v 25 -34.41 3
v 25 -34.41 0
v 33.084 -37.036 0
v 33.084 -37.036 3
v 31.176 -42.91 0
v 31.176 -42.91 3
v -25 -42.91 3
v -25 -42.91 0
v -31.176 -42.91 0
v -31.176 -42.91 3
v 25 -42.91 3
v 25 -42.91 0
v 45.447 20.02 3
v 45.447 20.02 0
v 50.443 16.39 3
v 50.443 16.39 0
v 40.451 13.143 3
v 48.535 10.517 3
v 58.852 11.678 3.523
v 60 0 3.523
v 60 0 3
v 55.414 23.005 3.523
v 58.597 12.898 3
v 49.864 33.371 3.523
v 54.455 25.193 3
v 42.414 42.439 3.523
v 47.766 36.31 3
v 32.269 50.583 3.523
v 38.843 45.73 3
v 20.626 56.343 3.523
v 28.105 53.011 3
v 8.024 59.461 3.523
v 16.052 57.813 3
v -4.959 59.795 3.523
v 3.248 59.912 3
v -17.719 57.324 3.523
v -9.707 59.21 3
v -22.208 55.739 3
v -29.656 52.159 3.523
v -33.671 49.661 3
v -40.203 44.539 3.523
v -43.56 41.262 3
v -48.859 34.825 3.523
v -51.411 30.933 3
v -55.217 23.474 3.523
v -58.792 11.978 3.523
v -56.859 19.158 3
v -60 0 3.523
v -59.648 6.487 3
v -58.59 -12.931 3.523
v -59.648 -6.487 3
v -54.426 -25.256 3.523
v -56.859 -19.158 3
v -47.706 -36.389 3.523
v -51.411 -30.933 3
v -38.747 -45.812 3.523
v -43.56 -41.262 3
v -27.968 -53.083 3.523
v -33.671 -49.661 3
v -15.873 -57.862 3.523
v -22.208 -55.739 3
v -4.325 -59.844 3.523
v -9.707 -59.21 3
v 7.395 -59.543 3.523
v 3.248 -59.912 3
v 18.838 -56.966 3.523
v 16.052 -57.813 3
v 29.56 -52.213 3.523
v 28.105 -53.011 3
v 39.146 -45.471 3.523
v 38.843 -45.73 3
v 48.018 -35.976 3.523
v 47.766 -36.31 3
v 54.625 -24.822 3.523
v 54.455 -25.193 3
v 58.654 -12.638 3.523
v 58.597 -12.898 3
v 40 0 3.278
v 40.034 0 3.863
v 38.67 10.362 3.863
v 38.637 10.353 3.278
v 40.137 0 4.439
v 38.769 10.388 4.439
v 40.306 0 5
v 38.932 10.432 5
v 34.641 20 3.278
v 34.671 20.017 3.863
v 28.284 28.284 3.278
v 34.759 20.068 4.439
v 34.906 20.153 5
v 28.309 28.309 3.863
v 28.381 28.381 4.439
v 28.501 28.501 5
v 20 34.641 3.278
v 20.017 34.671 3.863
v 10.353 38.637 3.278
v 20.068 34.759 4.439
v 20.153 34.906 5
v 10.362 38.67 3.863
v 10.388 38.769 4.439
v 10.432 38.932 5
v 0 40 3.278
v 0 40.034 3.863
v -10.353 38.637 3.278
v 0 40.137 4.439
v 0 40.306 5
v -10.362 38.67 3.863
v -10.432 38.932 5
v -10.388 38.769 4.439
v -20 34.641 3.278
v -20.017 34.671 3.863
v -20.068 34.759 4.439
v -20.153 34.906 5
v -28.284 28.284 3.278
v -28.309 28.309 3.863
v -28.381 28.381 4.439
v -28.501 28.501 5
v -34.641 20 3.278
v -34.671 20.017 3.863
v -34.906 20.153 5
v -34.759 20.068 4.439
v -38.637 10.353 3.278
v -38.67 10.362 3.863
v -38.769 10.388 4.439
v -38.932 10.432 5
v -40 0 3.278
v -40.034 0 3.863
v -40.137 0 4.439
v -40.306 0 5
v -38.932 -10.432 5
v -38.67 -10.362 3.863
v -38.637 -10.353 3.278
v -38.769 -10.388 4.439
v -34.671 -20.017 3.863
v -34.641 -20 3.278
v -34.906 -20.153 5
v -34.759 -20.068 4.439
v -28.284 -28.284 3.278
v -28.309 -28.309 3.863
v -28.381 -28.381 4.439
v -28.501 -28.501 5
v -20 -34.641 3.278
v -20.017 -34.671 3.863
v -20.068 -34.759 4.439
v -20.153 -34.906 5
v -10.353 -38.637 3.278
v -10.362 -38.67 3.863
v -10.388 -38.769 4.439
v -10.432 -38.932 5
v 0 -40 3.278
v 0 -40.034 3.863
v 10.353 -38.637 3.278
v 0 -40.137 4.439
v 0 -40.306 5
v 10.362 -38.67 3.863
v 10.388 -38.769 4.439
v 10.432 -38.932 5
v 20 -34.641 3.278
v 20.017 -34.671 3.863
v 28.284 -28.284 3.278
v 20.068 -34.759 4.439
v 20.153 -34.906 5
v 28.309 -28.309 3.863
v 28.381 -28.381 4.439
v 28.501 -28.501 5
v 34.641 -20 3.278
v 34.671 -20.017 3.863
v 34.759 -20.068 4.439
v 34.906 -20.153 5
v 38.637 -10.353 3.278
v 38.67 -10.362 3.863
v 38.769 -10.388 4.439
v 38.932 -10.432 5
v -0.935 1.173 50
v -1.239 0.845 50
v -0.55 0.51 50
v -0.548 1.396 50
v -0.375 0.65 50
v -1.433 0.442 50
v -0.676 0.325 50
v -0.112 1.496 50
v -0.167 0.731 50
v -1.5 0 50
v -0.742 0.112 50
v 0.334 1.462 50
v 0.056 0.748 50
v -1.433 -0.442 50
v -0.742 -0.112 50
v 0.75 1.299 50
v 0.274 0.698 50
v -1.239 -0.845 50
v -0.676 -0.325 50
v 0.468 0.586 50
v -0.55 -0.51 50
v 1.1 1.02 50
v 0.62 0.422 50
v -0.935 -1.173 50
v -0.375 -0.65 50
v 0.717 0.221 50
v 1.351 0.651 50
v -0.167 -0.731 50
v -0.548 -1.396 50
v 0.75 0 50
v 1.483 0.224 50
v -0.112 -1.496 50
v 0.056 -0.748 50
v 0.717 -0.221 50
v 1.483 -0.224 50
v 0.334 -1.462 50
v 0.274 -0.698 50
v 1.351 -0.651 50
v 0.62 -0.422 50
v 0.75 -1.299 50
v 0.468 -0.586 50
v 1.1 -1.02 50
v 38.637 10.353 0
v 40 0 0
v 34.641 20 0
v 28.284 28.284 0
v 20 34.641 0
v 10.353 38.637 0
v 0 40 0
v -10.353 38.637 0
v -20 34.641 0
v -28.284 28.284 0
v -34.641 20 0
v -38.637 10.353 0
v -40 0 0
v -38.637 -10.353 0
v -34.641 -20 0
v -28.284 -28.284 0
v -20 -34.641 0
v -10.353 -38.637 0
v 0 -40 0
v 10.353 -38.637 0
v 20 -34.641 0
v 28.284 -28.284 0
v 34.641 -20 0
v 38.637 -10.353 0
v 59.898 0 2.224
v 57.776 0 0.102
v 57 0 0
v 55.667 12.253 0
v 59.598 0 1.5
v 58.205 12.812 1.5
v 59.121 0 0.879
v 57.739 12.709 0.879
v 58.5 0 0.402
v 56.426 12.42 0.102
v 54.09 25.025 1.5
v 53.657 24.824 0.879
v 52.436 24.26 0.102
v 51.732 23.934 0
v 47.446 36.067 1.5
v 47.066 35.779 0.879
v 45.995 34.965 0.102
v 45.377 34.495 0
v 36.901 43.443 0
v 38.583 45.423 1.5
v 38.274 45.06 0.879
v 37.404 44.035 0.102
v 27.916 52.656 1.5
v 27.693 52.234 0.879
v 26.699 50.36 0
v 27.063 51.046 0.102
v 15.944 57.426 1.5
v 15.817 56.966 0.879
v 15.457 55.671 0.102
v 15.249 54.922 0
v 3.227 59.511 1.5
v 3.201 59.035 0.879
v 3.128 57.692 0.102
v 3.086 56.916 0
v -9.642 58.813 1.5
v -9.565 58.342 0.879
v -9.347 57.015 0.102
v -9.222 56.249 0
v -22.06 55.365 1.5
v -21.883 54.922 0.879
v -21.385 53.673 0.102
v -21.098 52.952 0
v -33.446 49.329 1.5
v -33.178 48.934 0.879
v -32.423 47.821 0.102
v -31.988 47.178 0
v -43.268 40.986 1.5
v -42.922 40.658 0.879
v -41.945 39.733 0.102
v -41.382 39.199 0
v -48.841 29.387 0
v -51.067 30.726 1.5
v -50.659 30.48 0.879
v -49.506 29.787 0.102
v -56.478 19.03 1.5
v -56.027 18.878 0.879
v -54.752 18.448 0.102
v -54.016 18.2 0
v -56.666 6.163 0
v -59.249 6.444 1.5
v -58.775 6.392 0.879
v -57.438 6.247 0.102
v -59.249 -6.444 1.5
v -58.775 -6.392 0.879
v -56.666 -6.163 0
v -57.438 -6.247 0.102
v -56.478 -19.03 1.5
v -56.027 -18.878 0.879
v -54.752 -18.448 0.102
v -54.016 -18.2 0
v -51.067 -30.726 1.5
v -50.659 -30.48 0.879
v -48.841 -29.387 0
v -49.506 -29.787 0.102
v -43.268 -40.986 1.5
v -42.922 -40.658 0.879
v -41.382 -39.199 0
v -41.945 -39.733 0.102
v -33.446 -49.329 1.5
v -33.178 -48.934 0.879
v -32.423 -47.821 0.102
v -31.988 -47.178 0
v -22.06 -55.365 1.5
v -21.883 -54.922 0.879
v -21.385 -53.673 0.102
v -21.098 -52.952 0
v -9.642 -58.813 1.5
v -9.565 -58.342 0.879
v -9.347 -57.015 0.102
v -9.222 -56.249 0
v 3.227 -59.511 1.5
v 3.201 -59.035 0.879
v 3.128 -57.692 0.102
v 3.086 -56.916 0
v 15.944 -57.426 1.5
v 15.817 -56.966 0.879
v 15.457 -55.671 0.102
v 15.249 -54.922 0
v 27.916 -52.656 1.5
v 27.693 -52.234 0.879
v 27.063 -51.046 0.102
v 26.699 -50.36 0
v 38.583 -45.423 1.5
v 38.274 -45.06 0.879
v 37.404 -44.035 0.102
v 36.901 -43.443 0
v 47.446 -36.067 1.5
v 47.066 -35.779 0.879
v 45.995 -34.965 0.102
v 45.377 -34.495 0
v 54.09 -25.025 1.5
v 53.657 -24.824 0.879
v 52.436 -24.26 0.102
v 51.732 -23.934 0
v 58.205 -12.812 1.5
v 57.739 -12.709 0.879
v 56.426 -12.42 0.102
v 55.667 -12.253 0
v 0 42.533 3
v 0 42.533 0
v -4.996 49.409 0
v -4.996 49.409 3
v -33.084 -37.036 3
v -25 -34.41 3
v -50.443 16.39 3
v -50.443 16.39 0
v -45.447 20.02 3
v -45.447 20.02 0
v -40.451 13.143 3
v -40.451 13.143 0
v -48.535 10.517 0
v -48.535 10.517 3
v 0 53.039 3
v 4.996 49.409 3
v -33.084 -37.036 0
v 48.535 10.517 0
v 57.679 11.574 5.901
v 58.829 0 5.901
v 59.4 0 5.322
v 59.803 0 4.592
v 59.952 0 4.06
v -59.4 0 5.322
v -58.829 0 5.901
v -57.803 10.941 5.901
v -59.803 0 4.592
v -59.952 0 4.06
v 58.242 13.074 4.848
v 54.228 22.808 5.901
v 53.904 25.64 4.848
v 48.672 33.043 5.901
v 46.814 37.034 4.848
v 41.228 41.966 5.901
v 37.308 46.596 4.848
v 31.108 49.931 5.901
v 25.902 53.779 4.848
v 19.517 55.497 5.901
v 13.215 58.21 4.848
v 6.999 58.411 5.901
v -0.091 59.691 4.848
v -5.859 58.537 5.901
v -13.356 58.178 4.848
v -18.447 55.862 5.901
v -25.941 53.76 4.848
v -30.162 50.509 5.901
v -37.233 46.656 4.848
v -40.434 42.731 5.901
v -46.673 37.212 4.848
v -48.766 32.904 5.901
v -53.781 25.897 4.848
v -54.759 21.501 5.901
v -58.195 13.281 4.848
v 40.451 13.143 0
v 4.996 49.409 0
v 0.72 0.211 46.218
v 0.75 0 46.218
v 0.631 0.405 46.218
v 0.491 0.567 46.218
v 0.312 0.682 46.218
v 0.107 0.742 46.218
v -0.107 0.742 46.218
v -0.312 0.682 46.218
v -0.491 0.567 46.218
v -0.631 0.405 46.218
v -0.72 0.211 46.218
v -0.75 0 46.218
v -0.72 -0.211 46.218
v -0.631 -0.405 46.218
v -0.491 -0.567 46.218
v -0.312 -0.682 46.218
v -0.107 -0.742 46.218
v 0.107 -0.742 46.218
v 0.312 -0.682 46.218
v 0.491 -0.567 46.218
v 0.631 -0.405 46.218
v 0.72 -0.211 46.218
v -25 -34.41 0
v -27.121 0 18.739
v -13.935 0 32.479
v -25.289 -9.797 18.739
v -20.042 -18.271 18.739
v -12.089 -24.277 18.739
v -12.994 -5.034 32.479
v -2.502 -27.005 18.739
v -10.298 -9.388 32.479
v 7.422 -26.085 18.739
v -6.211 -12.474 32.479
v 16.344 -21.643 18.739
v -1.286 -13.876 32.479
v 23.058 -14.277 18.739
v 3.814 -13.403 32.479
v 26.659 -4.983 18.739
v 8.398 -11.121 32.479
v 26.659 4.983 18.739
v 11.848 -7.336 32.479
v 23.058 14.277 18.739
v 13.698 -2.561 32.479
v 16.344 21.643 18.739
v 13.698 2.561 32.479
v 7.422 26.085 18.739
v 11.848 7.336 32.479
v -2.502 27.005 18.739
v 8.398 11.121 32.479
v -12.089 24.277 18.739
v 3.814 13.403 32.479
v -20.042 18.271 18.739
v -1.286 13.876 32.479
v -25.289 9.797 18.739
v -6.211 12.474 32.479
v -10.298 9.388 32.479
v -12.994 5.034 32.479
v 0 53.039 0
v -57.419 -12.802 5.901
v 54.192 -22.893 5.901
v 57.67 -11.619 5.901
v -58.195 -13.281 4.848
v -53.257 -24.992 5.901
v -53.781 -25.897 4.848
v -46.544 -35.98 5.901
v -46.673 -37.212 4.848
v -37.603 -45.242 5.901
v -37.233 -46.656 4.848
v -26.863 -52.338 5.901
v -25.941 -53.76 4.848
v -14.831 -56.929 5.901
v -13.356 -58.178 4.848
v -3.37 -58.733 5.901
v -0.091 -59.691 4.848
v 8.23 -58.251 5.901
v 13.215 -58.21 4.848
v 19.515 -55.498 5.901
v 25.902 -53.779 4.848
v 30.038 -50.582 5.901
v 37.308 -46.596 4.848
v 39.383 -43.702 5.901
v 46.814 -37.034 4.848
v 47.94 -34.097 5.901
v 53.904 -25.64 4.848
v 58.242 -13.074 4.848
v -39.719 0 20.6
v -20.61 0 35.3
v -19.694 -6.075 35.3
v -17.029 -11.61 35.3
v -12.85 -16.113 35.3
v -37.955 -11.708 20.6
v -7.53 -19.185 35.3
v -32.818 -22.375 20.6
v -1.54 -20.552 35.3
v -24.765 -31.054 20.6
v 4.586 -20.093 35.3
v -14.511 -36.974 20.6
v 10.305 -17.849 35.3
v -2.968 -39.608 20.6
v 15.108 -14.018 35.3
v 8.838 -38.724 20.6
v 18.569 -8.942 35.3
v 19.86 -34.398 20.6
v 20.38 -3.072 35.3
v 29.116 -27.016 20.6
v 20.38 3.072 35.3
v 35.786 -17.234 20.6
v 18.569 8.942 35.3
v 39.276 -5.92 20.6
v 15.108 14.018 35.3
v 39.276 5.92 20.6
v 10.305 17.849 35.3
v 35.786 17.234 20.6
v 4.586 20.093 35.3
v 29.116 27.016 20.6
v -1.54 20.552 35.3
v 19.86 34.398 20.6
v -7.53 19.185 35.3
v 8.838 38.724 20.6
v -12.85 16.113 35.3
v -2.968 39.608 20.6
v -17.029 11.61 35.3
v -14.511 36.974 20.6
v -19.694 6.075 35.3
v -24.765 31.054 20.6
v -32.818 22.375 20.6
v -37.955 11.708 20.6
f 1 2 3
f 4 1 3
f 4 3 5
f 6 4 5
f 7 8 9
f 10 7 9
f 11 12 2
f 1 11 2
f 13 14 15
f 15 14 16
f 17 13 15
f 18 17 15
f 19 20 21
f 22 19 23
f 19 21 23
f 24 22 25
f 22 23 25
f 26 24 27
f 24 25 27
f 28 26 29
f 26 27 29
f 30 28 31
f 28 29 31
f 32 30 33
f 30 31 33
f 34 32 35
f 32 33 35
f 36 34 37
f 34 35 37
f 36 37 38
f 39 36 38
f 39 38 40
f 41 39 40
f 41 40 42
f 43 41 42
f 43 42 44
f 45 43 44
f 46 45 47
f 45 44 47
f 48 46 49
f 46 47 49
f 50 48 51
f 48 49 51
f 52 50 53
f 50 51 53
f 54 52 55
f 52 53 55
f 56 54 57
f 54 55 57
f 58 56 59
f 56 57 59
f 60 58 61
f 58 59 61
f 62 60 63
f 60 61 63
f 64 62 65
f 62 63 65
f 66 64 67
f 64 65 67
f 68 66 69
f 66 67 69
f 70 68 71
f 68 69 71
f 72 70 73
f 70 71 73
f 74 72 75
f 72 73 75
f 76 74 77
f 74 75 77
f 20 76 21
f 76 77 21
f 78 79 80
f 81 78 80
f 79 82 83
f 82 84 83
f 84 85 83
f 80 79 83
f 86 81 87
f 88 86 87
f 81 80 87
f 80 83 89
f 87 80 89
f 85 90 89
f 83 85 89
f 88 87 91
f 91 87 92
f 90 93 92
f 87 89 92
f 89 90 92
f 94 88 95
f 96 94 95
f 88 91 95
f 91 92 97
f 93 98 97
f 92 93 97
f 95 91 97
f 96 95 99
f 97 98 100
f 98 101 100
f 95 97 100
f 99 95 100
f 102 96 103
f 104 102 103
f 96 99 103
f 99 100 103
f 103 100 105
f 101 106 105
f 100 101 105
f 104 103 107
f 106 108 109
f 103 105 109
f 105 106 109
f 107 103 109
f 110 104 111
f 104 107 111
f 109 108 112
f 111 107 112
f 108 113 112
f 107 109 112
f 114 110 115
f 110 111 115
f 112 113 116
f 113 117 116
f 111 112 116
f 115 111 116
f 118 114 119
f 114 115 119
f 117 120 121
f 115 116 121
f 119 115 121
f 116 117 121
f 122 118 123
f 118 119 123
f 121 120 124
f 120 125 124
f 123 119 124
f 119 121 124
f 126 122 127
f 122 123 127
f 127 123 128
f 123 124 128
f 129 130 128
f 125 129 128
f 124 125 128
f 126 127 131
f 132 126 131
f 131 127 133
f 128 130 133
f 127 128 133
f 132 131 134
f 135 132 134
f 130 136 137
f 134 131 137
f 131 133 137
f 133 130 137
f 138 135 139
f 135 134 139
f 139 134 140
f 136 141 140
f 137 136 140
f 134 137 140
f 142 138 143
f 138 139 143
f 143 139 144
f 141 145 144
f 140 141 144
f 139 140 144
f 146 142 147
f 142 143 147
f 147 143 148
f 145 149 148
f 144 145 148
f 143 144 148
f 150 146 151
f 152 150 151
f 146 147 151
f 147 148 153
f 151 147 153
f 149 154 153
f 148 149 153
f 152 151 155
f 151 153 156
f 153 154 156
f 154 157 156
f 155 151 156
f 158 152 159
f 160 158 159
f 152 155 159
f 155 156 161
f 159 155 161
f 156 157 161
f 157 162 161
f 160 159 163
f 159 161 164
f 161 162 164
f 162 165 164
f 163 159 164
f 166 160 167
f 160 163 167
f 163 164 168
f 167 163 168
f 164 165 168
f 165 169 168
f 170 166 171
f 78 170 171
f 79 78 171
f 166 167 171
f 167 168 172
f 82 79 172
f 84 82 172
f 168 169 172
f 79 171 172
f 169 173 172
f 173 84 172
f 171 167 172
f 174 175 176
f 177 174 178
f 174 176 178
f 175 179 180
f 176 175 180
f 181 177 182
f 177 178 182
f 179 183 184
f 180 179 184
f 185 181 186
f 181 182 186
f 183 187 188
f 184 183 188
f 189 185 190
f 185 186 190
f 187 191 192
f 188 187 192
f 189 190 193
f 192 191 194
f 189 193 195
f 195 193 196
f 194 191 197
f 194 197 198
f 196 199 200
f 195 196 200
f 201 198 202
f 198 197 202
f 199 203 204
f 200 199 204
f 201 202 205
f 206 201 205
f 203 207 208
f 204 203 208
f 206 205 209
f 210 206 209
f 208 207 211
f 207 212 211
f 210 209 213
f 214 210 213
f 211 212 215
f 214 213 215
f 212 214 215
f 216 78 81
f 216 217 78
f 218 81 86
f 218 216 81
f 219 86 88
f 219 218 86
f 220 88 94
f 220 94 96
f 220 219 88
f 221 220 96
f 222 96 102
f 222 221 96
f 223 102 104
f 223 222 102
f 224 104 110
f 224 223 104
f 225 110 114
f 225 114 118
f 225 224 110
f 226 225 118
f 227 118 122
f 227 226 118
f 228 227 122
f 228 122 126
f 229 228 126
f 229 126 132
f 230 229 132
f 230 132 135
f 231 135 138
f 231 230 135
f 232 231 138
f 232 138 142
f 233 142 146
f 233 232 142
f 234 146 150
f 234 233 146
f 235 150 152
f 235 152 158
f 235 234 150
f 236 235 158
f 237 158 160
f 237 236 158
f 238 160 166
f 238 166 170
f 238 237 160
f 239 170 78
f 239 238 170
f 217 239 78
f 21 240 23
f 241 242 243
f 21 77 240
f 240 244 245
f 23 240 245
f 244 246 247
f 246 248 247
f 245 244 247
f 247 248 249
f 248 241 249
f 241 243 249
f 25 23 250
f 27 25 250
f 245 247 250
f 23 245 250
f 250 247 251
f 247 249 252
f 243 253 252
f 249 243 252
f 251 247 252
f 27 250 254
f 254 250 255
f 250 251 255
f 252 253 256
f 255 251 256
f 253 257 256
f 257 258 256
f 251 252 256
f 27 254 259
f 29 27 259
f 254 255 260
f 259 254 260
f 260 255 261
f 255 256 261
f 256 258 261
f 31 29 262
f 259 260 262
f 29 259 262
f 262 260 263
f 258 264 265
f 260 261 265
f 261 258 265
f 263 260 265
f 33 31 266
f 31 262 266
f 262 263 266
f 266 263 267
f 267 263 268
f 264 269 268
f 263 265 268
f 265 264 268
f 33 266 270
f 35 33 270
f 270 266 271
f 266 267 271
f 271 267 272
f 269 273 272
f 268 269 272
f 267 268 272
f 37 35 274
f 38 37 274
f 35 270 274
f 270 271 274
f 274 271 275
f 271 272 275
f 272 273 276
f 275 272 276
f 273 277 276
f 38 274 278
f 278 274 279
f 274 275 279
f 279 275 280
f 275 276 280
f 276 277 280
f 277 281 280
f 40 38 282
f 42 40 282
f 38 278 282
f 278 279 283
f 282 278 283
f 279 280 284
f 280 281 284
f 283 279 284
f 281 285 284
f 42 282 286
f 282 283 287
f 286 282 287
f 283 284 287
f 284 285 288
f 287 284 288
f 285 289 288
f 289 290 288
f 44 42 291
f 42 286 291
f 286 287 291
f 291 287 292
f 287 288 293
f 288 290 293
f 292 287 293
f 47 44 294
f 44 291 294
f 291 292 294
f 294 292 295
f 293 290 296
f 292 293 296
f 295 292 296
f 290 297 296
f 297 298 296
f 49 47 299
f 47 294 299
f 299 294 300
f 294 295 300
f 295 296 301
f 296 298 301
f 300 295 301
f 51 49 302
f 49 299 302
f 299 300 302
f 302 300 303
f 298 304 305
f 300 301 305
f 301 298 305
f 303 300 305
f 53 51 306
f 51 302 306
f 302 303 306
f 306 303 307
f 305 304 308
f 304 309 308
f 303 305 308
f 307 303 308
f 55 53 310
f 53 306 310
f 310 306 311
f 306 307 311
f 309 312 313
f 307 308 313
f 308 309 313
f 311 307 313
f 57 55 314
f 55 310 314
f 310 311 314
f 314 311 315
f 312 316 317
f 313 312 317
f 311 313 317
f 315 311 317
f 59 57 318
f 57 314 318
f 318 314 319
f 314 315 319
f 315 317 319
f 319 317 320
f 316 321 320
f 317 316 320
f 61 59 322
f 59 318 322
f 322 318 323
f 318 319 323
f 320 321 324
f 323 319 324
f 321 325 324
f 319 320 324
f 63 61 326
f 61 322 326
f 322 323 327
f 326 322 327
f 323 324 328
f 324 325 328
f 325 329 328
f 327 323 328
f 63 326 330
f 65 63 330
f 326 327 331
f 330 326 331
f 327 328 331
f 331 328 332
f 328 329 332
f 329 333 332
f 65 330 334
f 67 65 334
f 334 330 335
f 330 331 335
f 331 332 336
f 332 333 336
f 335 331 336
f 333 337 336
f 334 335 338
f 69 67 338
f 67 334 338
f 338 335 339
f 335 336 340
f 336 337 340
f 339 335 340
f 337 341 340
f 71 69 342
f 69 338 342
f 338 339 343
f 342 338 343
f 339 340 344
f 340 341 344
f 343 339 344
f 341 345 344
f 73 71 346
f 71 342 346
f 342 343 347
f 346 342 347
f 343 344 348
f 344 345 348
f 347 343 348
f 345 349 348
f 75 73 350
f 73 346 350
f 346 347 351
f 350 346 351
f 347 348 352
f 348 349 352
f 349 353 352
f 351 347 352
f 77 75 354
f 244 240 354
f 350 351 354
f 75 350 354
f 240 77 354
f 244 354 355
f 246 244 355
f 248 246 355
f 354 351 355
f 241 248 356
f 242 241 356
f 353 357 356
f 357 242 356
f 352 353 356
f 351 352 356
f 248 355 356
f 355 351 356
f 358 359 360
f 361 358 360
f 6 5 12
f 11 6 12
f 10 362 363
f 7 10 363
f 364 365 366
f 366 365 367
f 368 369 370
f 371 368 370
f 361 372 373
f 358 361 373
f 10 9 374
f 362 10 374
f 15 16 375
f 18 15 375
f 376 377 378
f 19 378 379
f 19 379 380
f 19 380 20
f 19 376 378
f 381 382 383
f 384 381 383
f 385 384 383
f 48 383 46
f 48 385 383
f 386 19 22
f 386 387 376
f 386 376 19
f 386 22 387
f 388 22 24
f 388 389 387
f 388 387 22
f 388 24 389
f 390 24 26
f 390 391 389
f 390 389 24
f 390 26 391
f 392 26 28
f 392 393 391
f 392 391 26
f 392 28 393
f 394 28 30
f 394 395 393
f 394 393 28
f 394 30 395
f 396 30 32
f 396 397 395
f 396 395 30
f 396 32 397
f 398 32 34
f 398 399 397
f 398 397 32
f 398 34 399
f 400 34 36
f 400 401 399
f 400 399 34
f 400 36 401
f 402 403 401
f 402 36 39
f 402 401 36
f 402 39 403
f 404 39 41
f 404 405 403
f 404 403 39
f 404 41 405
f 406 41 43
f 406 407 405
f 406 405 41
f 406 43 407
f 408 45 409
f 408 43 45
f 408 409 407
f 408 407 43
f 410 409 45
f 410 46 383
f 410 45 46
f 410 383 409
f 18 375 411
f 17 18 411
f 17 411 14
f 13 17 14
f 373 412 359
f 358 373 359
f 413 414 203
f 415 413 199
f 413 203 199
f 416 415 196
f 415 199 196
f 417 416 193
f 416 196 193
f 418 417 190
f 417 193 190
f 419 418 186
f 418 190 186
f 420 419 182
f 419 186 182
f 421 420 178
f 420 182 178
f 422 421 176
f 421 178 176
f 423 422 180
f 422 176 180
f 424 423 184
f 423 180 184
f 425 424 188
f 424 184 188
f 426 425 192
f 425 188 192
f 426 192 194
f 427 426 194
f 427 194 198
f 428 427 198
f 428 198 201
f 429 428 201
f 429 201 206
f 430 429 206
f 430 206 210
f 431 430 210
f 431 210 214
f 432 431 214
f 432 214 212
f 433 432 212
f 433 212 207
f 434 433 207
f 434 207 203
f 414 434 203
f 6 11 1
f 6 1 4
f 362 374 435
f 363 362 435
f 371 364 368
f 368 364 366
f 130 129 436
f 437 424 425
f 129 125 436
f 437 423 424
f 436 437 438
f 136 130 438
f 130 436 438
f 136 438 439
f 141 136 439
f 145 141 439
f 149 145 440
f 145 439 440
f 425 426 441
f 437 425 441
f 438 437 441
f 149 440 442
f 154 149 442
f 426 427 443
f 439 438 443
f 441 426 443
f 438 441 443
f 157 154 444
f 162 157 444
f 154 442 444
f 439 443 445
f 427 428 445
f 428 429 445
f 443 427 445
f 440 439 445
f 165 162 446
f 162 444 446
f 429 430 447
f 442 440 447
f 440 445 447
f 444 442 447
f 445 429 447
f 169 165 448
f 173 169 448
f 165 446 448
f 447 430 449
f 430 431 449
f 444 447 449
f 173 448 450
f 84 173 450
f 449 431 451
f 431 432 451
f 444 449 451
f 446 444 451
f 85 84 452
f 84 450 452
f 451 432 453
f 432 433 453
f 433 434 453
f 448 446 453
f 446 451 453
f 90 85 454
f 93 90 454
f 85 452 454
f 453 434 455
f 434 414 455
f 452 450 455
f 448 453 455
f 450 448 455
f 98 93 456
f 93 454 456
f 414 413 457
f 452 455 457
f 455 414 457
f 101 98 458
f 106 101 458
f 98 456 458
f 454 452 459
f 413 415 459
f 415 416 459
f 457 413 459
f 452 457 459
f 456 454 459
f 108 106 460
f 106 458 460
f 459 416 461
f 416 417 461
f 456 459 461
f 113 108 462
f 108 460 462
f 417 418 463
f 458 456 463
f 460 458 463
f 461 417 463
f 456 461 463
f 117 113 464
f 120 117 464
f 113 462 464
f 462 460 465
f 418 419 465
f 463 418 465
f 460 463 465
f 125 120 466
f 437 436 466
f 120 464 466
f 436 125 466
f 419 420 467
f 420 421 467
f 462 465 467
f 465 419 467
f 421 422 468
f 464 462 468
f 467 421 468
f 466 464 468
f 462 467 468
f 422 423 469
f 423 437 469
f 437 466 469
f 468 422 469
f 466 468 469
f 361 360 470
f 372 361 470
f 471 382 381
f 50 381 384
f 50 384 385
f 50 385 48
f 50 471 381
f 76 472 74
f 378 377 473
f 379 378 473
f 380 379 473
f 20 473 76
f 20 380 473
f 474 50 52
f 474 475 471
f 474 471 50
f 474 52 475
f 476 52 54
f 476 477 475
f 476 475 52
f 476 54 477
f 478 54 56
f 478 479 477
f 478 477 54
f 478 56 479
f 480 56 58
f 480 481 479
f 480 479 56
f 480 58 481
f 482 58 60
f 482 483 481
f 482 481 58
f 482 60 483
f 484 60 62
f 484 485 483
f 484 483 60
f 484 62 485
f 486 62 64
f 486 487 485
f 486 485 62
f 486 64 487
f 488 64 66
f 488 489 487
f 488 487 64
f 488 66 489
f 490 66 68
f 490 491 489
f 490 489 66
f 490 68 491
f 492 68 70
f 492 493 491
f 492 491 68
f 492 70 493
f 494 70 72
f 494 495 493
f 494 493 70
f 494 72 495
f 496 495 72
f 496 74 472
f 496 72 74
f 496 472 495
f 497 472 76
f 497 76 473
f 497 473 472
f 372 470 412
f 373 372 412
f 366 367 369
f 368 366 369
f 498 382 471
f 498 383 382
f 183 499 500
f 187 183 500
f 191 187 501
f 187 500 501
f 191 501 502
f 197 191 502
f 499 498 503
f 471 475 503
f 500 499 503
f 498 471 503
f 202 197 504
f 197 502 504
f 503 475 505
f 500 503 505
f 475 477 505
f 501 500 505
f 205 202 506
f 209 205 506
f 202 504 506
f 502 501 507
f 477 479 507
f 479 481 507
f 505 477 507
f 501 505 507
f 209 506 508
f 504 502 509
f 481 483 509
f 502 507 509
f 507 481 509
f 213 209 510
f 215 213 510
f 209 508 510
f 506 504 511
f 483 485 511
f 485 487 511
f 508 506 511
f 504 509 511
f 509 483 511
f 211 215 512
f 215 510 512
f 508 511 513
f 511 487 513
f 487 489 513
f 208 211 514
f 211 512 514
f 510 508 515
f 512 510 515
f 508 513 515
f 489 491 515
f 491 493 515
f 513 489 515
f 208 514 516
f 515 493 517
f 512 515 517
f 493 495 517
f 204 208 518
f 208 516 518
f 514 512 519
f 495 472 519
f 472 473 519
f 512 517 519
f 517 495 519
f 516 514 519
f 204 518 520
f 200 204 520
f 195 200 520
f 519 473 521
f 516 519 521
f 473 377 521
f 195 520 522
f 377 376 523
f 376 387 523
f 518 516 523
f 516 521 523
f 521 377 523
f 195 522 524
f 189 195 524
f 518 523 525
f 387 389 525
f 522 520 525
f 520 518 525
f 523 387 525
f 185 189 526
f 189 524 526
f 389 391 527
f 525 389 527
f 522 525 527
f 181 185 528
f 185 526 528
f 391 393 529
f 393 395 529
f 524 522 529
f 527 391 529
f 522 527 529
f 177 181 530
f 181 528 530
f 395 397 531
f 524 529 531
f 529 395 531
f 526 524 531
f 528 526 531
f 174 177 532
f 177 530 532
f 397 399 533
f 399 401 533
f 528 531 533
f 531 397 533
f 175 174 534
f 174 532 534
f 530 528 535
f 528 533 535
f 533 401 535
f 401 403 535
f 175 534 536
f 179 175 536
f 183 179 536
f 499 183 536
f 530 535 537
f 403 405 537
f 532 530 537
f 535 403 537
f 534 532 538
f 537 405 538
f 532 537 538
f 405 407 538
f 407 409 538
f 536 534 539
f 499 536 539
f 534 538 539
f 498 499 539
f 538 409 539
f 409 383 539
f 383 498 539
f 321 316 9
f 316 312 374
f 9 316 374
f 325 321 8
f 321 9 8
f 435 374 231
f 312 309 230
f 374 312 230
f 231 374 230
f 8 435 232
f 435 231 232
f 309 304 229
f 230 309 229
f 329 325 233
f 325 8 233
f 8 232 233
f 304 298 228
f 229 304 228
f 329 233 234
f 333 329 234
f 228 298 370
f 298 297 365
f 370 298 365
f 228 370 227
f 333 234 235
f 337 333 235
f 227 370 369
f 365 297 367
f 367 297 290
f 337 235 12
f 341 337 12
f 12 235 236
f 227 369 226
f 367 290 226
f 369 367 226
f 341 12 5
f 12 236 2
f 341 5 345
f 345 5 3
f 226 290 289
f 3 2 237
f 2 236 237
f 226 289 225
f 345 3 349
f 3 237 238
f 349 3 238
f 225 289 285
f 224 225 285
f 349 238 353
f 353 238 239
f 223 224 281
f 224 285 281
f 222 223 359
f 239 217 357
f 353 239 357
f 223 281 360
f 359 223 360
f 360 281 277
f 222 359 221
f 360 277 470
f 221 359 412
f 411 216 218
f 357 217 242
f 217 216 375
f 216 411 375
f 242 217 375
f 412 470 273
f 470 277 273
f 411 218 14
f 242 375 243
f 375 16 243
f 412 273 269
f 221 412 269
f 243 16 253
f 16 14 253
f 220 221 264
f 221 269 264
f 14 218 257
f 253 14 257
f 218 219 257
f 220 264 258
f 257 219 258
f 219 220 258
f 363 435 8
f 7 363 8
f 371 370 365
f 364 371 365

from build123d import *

# Parameters (mm, degrees)
F0_R      = 60
F0_R_2    = 40
F3_DEPTH  = 3
F4_R      = 60
F4_R_2    = 40
F5_DEPTH  = 2
F9_R      = 3
F10_R     = 0.75
F11_DEPTH = 50.001


# Not quite as in the source:
# - a fillet or chamfer that OpenCascade refuses, or shapes differently, is made with other operations: its cross-section is extruded or revolved along the edge and cut away or added


with BuildPart() as f3:
    # F0 (on Top) → F3 (new body)
    with BuildSketch(Plane.XY):
        Circle(F0_R)
        Polygon((-25, -34.4095480118), (-25, -42.9095480118), (-31.175611488, -42.9095480118), (-33.0839803885, -37.036192464), align=None, mode=Mode.SUBTRACT)
        Polygon((25, -34.4095480118), (33.0839803885, -37.036192464), (31.175611488, -42.9095480118), (25, -42.9095480118), align=None, mode=Mode.SUBTRACT)
        Polygon((-45.4470243632, 20.0199222552), (-40.4508497187, 13.143277803), (-48.5348301073, 10.5166333508), (-50.4431990077, 16.3899888986), align=None, mode=Mode.SUBTRACT)
        Circle(F0_R_2, mode=Mode.SUBTRACT)
        Polygon((50.4431990077, 16.3899888986), (48.5348301073, 10.5166333508), (40.4508497187, 13.143277803), (45.4470243632, 20.0199222552), align=None, mode=Mode.SUBTRACT)
        Polygon((4.9961746445, 49.4091848698), (0, 42.5325404176), (-4.9961746445, 49.4091848698), (0, 53.0391182264), align=None, mode=Mode.SUBTRACT)
    extrude(amount=F3_DEPTH)

    # F4 (on face) → F5 (join)
    with BuildSketch(Plane.XY.offset(3)):
        Circle(F4_R)
        Polygon((-31.175611488, -42.9095480118), (-33.0839803885, -37.036192464), (-25, -34.4095480118), (-25, -42.9095480118), align=None, mode=Mode.SUBTRACT)
        Polygon((25, -42.9095480118), (25, -34.4095480118), (33.0839803885, -37.036192464), (31.175611488, -42.9095480118), align=None, mode=Mode.SUBTRACT)
        Polygon((-40.4508497187, 13.143277803), (-48.5348301073, 10.5166333508), (-50.4431990077, 16.3899888986), (-45.4470243632, 20.0199222552), align=None, mode=Mode.SUBTRACT)
        Circle(F4_R_2, mode=Mode.SUBTRACT)
        Polygon((40.4508497187, 13.143277803), (45.4470243632, 20.0199222552), (50.4431990077, 16.3899888986), (48.5348301073, 10.5166333508), align=None, mode=Mode.SUBTRACT)
        Polygon((0, 53.0391182264), (4.9961746445, 49.4091848698), (0, 42.5325404176), (-4.9961746445, 49.4091848698), align=None, mode=Mode.SUBTRACT)
        Polygon((-50.4431990077, 16.3899888986), (-48.5348301073, 10.5166333508), (-40.4508497187, 13.143277803), (-45.4470243632, 20.0199222552), align=None)
        Polygon((0, 42.5325404176), (4.9961746445, 49.4091848698), (0, 53.0391182264), (-4.9961746445, 49.4091848698), align=None)
        Polygon((50.4431990077, 16.3899888986), (45.4470243632, 20.0199222552), (40.4508497187, 13.143277803), (48.5348301073, 10.5166333508), align=None)
        Polygon((33.0839803885, -37.036192464), (25, -34.4095480118), (25, -42.9095480118), (31.175611488, -42.9095480118), align=None)
        Polygon((-25, -34.4095480118), (-33.0839803885, -37.036192464), (-31.175611488, -42.9095480118), (-25, -42.9095480118), align=None)
    extrude(amount=F5_DEPTH)

    # F6 (on Front) → F8 (revolve)
    with BuildSketch(Plane.XZ):
        Polygon((-1.5, 50), (-60, 5), (-40.3058288648, 5), (0, 47), (0, 50), align=None)
    revolve(axis=Axis((0, 0, 19.0761145204), (0, 0, 1)))

    # F9
    f9_edges = [f3.edges().sort_by_distance(p)[0] for p in [
        (0, -60, 5),
        (0, 60, 5),
        (-60, 0, 0),
    ]]
    fillet(f9_edges, radius=F9_R)

    # F10 (on offset) → F11 (cut, through all)
    with BuildSketch(Plane.XY.offset(50)):
        Circle(F10_R)
    extrude(amount=-F11_DEPTH, mode=Mode.SUBTRACT)

    # F12: fillet of radius 5 on 1 edges, made by hand

    # F12_s1 → F12_t2 (revolve, cut)
    with BuildSketch(Plane.XZ):
        with BuildLine():
            ThreePointArc((40, 3.2781529238), (40.0770509003, 4.1525510952), (40.3058288648, 5))
            Line((40.3058288648, 5), (40.2119454421, 5.0344369415))
            ThreePointArc((40.2119454421, 5.0344369415), (40.1529144324, 5.1), (40, 5.1))
            Line((40, 5.1), (39.9, 5))
            Line((39.9, 5), (39.9, 3.2781529238))
            Line((39.9, 3.2781529238), (40, 3.2781529238))
        make_face()
    revolve(axis=Axis((0, 0, 5), (0, 0, 1)), mode=Mode.SUBTRACT)


solid = f3.part
